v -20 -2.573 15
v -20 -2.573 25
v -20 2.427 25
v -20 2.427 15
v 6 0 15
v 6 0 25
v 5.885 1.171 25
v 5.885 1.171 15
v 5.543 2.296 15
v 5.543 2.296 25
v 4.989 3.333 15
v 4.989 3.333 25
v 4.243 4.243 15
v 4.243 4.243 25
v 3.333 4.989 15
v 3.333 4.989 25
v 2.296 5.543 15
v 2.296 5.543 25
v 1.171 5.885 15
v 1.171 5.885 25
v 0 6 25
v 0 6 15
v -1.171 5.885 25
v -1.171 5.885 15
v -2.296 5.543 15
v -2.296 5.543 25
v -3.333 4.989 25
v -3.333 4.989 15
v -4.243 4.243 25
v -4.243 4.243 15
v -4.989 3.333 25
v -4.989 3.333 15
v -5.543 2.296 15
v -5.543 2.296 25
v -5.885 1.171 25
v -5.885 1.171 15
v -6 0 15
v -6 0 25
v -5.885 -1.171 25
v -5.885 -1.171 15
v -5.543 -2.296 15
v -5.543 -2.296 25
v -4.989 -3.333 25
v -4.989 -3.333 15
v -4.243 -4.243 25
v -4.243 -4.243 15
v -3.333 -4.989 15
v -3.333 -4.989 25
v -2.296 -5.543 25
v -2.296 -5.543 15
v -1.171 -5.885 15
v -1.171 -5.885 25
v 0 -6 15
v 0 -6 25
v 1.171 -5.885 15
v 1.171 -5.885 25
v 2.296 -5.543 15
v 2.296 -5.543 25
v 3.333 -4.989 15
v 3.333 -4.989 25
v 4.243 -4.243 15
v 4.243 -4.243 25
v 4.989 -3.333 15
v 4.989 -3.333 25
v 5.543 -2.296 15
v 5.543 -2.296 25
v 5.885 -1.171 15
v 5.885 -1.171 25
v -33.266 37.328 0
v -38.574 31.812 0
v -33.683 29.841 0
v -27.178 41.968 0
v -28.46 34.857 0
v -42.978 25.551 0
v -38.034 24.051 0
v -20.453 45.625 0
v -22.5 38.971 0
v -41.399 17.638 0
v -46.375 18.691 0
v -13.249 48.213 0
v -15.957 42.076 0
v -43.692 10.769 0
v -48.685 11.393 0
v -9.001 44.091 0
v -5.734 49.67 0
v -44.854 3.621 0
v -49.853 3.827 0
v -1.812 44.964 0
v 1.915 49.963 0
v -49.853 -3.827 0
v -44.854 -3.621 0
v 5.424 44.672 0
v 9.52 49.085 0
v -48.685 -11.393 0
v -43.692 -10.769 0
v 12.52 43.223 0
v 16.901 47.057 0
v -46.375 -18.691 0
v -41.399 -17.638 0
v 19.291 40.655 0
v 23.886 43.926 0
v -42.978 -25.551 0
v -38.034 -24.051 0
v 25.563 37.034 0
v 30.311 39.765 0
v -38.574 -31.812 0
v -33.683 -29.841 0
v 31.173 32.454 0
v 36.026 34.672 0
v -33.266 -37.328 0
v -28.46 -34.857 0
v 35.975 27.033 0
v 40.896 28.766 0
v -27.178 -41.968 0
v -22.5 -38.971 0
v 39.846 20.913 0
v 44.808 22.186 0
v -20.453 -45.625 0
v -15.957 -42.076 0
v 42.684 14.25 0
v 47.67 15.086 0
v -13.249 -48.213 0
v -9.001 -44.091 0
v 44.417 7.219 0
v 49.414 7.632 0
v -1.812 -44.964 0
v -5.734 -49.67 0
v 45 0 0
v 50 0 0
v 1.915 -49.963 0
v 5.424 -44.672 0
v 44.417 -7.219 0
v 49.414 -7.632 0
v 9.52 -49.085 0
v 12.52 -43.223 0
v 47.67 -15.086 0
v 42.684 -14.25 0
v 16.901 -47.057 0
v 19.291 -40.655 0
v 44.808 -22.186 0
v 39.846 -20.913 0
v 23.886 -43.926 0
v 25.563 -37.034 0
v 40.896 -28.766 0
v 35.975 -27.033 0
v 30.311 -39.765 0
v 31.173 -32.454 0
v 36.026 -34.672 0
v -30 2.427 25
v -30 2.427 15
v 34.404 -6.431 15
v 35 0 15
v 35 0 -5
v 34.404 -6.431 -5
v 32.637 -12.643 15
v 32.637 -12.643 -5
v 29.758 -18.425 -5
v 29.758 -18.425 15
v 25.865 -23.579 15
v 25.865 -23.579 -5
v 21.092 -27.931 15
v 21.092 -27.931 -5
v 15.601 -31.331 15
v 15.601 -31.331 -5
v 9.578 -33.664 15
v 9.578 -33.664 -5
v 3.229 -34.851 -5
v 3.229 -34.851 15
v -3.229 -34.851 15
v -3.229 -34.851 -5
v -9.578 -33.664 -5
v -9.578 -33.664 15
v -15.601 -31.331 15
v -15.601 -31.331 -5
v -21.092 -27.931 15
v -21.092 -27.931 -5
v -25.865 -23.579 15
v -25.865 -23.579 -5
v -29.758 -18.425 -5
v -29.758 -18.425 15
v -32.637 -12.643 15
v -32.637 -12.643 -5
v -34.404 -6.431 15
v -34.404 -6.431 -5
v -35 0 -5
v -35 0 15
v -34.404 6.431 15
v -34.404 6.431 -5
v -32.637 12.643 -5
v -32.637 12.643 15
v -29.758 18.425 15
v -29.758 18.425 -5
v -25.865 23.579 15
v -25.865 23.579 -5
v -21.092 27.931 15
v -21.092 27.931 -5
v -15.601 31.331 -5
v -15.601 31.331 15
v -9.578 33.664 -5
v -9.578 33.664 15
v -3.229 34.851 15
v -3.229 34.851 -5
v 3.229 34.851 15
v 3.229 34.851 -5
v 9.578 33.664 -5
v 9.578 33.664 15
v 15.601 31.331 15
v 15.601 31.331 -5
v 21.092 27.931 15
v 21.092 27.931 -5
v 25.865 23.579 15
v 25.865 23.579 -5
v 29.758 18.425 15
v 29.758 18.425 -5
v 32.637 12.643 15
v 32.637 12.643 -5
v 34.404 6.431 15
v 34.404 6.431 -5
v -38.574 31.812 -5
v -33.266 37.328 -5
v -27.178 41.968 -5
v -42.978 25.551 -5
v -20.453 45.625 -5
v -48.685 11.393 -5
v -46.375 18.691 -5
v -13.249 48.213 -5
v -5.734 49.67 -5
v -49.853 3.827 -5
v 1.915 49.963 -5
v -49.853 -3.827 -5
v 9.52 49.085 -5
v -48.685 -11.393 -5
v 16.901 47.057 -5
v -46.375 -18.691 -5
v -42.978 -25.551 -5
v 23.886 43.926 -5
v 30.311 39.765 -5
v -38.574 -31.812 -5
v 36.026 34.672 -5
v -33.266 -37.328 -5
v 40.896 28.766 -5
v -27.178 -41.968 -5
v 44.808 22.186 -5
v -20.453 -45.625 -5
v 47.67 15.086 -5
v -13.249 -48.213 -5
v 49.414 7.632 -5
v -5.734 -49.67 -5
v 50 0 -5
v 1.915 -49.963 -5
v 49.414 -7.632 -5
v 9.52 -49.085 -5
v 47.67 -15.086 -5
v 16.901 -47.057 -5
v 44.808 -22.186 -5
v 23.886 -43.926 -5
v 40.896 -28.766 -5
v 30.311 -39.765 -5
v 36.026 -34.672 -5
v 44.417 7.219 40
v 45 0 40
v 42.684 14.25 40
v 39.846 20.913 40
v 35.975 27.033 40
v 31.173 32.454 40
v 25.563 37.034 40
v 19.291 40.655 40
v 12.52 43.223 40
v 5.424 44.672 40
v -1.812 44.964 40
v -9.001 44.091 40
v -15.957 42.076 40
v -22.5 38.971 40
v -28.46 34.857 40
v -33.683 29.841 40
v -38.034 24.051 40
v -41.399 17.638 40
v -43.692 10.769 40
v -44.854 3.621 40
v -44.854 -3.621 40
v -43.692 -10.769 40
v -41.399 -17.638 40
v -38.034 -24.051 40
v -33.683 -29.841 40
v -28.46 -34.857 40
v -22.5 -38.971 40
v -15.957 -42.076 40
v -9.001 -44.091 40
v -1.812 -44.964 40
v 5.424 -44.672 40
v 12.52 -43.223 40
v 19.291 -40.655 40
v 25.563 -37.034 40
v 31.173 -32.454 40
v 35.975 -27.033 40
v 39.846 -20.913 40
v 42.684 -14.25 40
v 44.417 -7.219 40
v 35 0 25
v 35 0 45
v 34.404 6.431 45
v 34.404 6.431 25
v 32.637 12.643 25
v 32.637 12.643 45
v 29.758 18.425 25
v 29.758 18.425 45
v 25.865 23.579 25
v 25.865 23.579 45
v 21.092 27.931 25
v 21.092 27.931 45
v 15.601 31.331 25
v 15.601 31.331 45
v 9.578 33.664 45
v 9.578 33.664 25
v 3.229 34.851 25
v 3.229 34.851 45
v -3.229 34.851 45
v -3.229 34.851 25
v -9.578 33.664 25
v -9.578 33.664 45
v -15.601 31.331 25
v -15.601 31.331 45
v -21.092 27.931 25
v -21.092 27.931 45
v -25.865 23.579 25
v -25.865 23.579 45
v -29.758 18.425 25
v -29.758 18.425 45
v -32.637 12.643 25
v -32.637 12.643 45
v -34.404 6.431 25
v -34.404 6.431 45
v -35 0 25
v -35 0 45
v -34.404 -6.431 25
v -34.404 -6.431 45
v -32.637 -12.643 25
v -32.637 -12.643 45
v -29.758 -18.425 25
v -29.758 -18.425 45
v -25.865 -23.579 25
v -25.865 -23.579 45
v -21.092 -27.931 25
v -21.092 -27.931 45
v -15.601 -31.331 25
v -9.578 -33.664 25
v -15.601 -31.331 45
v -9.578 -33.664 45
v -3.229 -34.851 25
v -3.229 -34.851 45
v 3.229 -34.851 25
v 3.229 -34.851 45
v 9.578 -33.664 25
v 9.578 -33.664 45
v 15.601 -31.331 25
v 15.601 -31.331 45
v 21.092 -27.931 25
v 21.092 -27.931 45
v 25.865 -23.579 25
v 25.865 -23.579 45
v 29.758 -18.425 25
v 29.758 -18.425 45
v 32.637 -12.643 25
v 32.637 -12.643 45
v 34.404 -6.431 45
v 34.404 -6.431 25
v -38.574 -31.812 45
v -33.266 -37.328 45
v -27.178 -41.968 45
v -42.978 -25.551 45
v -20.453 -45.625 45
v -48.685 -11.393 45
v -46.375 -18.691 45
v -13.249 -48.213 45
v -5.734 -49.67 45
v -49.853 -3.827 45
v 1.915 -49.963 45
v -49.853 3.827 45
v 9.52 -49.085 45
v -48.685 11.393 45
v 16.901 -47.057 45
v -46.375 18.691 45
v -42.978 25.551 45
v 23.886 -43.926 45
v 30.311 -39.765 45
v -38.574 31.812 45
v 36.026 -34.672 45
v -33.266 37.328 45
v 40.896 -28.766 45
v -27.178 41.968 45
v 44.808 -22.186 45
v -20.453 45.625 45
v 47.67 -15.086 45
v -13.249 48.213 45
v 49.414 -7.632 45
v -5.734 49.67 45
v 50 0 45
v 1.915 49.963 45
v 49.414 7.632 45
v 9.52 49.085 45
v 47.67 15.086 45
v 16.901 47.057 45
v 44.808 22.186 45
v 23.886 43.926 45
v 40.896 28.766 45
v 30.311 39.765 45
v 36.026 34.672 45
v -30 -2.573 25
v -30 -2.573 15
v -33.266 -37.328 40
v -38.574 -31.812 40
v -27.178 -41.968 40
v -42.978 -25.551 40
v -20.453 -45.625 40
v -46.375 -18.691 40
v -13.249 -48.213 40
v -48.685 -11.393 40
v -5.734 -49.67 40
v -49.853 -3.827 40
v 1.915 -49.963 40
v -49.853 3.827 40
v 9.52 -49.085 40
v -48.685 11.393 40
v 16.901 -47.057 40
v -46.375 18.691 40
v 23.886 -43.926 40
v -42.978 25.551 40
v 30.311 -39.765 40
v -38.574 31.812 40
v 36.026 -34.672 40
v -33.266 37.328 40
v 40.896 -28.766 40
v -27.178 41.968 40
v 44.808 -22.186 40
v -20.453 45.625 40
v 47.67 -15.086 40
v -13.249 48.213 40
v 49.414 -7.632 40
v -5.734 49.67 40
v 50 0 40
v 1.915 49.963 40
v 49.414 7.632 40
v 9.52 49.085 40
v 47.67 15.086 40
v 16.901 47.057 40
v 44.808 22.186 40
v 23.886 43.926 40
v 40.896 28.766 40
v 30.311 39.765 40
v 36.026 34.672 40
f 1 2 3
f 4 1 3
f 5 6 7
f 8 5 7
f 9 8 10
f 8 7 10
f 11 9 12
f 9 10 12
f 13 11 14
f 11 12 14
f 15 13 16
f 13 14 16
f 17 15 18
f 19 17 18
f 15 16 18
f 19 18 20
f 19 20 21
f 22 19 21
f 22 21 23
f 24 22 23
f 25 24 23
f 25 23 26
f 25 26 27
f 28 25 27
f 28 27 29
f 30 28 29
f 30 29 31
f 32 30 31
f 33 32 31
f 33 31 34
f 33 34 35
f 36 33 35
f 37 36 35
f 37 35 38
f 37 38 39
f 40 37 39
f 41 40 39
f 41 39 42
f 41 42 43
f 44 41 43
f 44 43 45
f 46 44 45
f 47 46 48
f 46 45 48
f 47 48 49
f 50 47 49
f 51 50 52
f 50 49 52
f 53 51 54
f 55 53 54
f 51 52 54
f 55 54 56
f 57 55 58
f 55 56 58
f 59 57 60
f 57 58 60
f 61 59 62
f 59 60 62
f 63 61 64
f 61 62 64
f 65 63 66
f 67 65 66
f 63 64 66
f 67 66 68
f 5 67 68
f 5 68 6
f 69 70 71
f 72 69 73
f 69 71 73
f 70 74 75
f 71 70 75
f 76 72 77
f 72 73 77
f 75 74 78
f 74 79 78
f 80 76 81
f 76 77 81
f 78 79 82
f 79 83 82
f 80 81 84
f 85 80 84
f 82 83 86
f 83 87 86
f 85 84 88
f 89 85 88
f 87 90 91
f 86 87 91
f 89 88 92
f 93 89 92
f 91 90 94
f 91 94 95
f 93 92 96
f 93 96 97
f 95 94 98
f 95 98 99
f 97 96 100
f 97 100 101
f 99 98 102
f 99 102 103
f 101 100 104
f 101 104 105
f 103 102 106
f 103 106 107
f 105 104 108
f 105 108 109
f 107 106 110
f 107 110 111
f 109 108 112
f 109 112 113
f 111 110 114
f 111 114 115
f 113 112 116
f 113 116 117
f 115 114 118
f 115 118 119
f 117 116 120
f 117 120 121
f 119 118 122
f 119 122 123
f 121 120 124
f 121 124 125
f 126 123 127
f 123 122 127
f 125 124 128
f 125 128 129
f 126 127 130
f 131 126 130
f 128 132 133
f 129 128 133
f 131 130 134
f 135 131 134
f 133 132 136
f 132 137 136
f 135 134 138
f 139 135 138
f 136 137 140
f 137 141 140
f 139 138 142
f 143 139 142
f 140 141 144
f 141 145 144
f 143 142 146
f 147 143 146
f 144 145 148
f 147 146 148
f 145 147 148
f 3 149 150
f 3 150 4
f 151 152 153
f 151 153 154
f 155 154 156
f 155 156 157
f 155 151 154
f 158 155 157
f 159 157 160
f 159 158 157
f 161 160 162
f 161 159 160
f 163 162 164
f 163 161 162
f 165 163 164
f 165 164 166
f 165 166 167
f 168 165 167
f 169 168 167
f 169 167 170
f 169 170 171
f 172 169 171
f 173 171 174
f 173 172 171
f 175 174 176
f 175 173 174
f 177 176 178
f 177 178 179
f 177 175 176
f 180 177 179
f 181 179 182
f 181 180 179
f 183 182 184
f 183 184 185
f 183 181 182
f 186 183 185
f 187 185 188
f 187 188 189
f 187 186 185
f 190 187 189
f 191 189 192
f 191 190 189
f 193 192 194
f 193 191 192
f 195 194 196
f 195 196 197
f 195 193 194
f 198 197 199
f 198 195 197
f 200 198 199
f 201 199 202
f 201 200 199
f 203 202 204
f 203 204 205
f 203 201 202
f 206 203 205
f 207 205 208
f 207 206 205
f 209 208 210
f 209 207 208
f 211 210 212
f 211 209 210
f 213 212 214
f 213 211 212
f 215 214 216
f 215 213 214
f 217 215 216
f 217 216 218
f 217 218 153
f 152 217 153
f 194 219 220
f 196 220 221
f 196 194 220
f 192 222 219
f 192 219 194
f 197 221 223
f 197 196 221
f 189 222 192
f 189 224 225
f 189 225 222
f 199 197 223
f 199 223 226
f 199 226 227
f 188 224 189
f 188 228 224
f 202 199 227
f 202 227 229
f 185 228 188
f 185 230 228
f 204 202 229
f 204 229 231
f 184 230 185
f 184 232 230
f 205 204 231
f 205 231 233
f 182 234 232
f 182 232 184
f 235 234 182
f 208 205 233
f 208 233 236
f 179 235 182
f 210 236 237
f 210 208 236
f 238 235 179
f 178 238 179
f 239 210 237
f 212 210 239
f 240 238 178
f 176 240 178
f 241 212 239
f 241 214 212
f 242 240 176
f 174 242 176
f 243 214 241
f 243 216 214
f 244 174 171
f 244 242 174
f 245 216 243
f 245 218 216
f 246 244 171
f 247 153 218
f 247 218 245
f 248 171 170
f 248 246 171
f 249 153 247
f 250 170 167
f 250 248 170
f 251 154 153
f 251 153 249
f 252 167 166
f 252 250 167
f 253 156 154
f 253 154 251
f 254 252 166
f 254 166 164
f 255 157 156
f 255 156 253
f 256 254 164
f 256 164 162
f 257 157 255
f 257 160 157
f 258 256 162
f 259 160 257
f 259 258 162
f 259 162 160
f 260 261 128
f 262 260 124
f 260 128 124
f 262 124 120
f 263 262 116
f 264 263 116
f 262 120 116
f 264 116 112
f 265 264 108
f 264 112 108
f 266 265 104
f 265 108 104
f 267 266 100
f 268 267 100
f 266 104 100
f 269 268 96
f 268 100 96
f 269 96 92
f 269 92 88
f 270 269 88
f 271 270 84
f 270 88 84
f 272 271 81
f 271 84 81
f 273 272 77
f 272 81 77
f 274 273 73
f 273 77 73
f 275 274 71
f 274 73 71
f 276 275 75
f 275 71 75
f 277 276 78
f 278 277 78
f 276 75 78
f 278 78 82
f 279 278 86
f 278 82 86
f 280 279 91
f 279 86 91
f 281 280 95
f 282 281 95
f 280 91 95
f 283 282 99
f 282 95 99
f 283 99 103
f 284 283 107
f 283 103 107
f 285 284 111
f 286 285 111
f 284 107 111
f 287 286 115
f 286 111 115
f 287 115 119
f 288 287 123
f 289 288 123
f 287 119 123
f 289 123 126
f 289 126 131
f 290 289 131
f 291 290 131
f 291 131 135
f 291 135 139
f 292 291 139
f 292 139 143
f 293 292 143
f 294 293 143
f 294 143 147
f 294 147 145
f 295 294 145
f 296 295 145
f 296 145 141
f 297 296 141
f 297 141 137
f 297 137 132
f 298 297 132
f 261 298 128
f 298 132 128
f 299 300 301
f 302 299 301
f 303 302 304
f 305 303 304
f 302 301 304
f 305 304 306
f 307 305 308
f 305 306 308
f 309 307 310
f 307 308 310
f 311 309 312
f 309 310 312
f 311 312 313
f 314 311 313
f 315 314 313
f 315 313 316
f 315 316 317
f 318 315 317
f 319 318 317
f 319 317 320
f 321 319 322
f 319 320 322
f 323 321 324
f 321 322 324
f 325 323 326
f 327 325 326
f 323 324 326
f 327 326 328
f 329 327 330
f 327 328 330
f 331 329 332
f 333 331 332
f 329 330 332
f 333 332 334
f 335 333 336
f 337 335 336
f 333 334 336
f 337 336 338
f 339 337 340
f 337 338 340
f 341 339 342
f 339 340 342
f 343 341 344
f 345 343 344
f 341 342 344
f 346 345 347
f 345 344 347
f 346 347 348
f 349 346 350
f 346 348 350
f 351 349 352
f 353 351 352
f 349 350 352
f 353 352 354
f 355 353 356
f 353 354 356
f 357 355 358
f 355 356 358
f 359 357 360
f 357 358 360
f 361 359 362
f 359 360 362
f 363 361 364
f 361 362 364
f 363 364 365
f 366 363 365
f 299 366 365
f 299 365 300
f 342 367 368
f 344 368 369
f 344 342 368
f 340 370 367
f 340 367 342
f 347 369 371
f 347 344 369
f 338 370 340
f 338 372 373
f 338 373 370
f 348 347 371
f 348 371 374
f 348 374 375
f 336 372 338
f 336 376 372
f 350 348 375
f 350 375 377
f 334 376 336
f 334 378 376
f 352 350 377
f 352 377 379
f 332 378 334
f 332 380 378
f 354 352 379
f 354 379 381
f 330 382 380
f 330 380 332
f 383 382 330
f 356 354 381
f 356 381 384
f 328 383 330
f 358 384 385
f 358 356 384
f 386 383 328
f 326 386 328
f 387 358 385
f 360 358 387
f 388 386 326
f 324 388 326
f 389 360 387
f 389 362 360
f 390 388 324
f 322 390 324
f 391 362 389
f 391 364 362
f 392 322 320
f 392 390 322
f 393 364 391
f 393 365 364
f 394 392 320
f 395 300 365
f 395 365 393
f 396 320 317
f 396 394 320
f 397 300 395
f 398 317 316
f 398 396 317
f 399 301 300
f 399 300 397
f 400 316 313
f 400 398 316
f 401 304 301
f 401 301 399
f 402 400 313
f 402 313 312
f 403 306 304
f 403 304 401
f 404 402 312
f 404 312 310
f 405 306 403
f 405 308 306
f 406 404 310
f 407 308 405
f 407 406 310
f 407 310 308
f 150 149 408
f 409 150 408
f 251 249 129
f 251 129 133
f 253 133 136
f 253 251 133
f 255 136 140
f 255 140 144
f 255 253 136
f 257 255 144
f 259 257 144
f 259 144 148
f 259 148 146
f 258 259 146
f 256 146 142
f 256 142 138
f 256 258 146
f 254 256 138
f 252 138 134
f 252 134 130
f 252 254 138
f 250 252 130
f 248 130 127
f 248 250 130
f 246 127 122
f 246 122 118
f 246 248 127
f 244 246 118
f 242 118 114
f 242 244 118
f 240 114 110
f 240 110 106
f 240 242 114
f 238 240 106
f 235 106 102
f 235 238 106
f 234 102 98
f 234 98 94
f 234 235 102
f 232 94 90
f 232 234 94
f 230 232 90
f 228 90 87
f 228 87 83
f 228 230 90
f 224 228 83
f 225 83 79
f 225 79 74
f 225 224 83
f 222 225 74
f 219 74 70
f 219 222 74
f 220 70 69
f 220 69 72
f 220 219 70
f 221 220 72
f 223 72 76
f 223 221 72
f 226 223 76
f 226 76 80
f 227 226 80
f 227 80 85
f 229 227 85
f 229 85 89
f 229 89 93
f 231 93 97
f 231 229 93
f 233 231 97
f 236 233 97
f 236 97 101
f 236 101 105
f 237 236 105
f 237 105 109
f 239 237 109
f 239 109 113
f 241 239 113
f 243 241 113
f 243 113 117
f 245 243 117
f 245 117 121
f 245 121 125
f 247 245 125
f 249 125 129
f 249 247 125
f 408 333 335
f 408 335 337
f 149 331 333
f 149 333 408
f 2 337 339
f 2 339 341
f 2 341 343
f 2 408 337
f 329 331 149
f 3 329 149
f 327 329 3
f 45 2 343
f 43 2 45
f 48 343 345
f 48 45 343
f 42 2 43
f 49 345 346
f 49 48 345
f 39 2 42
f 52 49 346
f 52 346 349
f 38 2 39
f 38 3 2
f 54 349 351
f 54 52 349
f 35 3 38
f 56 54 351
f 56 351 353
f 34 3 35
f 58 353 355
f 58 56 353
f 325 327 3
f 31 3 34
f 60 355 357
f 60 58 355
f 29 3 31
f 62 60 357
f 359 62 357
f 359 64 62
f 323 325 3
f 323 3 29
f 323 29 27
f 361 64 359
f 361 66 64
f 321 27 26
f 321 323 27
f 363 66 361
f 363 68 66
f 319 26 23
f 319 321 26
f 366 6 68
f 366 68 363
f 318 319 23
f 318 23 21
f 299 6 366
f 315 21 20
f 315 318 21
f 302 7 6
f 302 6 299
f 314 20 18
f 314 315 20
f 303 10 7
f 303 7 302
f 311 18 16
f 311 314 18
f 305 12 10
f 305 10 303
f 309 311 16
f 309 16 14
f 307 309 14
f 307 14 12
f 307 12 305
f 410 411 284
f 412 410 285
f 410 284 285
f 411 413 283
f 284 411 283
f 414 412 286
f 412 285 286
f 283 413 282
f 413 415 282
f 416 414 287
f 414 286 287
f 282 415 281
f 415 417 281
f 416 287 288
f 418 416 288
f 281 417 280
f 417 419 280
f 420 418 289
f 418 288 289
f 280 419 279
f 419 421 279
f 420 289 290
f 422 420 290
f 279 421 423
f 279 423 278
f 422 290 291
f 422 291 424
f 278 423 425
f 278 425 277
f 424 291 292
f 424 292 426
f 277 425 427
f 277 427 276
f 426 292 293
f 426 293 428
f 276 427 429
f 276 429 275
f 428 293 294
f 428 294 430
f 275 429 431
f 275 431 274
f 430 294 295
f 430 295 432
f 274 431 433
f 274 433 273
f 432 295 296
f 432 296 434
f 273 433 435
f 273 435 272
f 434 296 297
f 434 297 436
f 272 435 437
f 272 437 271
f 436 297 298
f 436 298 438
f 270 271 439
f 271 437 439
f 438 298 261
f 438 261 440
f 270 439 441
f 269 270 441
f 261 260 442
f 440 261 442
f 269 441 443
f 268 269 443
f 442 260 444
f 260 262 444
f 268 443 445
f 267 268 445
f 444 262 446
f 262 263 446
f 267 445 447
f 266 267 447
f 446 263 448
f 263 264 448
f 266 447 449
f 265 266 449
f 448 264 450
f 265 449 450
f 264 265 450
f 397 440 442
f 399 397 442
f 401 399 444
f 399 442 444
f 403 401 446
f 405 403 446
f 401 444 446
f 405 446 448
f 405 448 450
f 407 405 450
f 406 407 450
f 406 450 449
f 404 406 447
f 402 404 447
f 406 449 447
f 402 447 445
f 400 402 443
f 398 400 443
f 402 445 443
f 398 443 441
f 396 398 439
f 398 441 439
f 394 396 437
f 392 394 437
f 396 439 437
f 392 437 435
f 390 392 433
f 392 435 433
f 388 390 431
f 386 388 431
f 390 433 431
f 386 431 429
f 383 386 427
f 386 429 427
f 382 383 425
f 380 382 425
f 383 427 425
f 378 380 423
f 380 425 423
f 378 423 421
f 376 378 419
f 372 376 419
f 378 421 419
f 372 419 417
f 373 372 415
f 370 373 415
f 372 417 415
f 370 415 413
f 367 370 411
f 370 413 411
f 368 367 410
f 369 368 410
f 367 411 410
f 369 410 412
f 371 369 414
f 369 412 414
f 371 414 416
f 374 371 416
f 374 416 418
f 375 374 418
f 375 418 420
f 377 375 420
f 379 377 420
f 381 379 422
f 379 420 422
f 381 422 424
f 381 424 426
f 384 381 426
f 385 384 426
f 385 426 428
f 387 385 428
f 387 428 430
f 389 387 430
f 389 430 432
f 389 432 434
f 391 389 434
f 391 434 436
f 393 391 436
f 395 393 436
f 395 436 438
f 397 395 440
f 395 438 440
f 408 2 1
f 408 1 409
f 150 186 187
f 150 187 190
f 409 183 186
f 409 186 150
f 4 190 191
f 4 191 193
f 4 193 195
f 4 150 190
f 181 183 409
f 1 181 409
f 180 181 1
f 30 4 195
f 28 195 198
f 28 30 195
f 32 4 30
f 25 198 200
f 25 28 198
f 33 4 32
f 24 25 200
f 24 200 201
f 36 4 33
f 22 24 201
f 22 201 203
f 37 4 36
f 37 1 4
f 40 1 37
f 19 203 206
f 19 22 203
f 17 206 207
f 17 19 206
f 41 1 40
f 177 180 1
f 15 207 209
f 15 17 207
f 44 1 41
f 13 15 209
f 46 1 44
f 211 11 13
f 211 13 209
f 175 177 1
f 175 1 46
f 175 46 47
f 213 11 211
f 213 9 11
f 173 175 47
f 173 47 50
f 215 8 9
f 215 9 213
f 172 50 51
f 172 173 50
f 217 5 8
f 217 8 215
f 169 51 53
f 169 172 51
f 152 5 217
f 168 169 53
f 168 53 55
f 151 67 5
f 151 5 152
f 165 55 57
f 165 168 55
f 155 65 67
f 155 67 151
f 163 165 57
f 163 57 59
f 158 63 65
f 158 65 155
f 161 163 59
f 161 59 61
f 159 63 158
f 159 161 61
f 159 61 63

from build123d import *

# Parameters (mm, degrees)
SKETCH1_R           = 45
BOSS_EXTRUDE1_DEPTH = 40
SKETCH2_R           = 50
BOSS_EXTRUDE2_DEPTH = 5
BOSS_EXTRUDE3_START = 5
SKETCH3_R           = 50
BOSS_EXTRUDE3_DEPTH = 5
SKETCH4_R           = 35
CUT_EXTRUDE1_DEPTH  = 20
CUT_EXTRUDE2_START  = -20
SKETCH5_R           = 35
CUT_EXTRUDE2_DEPTH  = 20
SKETCH6_R           = 6
CUT_EXTRUDE3_DEPTH  = 20
CUT_EXTRUDE4_DEPTH  = 10


with BuildPart() as part:
    # Sketch1 → Boss-Extrude1 (new body)
    with BuildSketch(Plane.XY):
        Circle(SKETCH1_R)
    extrude(amount=BOSS_EXTRUDE1_DEPTH)

    # Sketch2 → Boss-Extrude2 (add)
    with BuildSketch(Plane.XY.offset(40)):
        Circle(SKETCH2_R)
    extrude(amount=BOSS_EXTRUDE2_DEPTH)

    # Sketch3 → Boss-Extrude3 (add)
    with BuildSketch(Plane(origin=(0, 0, 0), x_dir=(-1, 0, 0), z_dir=(0, 0, -1)).offset(BOSS_EXTRUDE3_START)):
        with Locations(Location((0, 0, 0), (0, 0, 180))):
            Circle(SKETCH3_R)
    extrude(amount=-BOSS_EXTRUDE3_DEPTH)

    # Sketch4 → Cut-Extrude1 (cut)
    with BuildSketch(Plane.XY.offset(45)):
        Circle(SKETCH4_R)
    extrude(amount=-CUT_EXTRUDE1_DEPTH, mode=Mode.SUBTRACT)

    # Sketch5 → Cut-Extrude2 (cut)
    with BuildSketch(Plane(origin=(0, 0, -5), x_dir=(-1, 0, 0), z_dir=(0, 0, -1)).offset(CUT_EXTRUDE2_START)):
        with Locations(Location((0, 0, 0), (0, 0, 180))):
            Circle(SKETCH5_R)
    extrude(amount=CUT_EXTRUDE2_DEPTH, mode=Mode.SUBTRACT)

    # Sketch6 → Cut-Extrude3 (cut)
    with BuildSketch(Plane.XY.offset(25)):
        Circle(SKETCH6_R)
    extrude(amount=-CUT_EXTRUDE3_DEPTH, mode=Mode.SUBTRACT)

    # Sketch7 → Cut-Extrude4 (cut)
    with BuildSketch(Plane.XY.offset(25)):
        Polygon((-20, -0.07309958), (-20, -2.57309958), (-30, -2.57309958), (-30, -0.07309958), (-30, 2.42690042), (-20, 2.42690042), align=None)
    extrude(amount=-CUT_EXTRUDE4_DEPTH, mode=Mode.SUBTRACT)


solid = part.part
